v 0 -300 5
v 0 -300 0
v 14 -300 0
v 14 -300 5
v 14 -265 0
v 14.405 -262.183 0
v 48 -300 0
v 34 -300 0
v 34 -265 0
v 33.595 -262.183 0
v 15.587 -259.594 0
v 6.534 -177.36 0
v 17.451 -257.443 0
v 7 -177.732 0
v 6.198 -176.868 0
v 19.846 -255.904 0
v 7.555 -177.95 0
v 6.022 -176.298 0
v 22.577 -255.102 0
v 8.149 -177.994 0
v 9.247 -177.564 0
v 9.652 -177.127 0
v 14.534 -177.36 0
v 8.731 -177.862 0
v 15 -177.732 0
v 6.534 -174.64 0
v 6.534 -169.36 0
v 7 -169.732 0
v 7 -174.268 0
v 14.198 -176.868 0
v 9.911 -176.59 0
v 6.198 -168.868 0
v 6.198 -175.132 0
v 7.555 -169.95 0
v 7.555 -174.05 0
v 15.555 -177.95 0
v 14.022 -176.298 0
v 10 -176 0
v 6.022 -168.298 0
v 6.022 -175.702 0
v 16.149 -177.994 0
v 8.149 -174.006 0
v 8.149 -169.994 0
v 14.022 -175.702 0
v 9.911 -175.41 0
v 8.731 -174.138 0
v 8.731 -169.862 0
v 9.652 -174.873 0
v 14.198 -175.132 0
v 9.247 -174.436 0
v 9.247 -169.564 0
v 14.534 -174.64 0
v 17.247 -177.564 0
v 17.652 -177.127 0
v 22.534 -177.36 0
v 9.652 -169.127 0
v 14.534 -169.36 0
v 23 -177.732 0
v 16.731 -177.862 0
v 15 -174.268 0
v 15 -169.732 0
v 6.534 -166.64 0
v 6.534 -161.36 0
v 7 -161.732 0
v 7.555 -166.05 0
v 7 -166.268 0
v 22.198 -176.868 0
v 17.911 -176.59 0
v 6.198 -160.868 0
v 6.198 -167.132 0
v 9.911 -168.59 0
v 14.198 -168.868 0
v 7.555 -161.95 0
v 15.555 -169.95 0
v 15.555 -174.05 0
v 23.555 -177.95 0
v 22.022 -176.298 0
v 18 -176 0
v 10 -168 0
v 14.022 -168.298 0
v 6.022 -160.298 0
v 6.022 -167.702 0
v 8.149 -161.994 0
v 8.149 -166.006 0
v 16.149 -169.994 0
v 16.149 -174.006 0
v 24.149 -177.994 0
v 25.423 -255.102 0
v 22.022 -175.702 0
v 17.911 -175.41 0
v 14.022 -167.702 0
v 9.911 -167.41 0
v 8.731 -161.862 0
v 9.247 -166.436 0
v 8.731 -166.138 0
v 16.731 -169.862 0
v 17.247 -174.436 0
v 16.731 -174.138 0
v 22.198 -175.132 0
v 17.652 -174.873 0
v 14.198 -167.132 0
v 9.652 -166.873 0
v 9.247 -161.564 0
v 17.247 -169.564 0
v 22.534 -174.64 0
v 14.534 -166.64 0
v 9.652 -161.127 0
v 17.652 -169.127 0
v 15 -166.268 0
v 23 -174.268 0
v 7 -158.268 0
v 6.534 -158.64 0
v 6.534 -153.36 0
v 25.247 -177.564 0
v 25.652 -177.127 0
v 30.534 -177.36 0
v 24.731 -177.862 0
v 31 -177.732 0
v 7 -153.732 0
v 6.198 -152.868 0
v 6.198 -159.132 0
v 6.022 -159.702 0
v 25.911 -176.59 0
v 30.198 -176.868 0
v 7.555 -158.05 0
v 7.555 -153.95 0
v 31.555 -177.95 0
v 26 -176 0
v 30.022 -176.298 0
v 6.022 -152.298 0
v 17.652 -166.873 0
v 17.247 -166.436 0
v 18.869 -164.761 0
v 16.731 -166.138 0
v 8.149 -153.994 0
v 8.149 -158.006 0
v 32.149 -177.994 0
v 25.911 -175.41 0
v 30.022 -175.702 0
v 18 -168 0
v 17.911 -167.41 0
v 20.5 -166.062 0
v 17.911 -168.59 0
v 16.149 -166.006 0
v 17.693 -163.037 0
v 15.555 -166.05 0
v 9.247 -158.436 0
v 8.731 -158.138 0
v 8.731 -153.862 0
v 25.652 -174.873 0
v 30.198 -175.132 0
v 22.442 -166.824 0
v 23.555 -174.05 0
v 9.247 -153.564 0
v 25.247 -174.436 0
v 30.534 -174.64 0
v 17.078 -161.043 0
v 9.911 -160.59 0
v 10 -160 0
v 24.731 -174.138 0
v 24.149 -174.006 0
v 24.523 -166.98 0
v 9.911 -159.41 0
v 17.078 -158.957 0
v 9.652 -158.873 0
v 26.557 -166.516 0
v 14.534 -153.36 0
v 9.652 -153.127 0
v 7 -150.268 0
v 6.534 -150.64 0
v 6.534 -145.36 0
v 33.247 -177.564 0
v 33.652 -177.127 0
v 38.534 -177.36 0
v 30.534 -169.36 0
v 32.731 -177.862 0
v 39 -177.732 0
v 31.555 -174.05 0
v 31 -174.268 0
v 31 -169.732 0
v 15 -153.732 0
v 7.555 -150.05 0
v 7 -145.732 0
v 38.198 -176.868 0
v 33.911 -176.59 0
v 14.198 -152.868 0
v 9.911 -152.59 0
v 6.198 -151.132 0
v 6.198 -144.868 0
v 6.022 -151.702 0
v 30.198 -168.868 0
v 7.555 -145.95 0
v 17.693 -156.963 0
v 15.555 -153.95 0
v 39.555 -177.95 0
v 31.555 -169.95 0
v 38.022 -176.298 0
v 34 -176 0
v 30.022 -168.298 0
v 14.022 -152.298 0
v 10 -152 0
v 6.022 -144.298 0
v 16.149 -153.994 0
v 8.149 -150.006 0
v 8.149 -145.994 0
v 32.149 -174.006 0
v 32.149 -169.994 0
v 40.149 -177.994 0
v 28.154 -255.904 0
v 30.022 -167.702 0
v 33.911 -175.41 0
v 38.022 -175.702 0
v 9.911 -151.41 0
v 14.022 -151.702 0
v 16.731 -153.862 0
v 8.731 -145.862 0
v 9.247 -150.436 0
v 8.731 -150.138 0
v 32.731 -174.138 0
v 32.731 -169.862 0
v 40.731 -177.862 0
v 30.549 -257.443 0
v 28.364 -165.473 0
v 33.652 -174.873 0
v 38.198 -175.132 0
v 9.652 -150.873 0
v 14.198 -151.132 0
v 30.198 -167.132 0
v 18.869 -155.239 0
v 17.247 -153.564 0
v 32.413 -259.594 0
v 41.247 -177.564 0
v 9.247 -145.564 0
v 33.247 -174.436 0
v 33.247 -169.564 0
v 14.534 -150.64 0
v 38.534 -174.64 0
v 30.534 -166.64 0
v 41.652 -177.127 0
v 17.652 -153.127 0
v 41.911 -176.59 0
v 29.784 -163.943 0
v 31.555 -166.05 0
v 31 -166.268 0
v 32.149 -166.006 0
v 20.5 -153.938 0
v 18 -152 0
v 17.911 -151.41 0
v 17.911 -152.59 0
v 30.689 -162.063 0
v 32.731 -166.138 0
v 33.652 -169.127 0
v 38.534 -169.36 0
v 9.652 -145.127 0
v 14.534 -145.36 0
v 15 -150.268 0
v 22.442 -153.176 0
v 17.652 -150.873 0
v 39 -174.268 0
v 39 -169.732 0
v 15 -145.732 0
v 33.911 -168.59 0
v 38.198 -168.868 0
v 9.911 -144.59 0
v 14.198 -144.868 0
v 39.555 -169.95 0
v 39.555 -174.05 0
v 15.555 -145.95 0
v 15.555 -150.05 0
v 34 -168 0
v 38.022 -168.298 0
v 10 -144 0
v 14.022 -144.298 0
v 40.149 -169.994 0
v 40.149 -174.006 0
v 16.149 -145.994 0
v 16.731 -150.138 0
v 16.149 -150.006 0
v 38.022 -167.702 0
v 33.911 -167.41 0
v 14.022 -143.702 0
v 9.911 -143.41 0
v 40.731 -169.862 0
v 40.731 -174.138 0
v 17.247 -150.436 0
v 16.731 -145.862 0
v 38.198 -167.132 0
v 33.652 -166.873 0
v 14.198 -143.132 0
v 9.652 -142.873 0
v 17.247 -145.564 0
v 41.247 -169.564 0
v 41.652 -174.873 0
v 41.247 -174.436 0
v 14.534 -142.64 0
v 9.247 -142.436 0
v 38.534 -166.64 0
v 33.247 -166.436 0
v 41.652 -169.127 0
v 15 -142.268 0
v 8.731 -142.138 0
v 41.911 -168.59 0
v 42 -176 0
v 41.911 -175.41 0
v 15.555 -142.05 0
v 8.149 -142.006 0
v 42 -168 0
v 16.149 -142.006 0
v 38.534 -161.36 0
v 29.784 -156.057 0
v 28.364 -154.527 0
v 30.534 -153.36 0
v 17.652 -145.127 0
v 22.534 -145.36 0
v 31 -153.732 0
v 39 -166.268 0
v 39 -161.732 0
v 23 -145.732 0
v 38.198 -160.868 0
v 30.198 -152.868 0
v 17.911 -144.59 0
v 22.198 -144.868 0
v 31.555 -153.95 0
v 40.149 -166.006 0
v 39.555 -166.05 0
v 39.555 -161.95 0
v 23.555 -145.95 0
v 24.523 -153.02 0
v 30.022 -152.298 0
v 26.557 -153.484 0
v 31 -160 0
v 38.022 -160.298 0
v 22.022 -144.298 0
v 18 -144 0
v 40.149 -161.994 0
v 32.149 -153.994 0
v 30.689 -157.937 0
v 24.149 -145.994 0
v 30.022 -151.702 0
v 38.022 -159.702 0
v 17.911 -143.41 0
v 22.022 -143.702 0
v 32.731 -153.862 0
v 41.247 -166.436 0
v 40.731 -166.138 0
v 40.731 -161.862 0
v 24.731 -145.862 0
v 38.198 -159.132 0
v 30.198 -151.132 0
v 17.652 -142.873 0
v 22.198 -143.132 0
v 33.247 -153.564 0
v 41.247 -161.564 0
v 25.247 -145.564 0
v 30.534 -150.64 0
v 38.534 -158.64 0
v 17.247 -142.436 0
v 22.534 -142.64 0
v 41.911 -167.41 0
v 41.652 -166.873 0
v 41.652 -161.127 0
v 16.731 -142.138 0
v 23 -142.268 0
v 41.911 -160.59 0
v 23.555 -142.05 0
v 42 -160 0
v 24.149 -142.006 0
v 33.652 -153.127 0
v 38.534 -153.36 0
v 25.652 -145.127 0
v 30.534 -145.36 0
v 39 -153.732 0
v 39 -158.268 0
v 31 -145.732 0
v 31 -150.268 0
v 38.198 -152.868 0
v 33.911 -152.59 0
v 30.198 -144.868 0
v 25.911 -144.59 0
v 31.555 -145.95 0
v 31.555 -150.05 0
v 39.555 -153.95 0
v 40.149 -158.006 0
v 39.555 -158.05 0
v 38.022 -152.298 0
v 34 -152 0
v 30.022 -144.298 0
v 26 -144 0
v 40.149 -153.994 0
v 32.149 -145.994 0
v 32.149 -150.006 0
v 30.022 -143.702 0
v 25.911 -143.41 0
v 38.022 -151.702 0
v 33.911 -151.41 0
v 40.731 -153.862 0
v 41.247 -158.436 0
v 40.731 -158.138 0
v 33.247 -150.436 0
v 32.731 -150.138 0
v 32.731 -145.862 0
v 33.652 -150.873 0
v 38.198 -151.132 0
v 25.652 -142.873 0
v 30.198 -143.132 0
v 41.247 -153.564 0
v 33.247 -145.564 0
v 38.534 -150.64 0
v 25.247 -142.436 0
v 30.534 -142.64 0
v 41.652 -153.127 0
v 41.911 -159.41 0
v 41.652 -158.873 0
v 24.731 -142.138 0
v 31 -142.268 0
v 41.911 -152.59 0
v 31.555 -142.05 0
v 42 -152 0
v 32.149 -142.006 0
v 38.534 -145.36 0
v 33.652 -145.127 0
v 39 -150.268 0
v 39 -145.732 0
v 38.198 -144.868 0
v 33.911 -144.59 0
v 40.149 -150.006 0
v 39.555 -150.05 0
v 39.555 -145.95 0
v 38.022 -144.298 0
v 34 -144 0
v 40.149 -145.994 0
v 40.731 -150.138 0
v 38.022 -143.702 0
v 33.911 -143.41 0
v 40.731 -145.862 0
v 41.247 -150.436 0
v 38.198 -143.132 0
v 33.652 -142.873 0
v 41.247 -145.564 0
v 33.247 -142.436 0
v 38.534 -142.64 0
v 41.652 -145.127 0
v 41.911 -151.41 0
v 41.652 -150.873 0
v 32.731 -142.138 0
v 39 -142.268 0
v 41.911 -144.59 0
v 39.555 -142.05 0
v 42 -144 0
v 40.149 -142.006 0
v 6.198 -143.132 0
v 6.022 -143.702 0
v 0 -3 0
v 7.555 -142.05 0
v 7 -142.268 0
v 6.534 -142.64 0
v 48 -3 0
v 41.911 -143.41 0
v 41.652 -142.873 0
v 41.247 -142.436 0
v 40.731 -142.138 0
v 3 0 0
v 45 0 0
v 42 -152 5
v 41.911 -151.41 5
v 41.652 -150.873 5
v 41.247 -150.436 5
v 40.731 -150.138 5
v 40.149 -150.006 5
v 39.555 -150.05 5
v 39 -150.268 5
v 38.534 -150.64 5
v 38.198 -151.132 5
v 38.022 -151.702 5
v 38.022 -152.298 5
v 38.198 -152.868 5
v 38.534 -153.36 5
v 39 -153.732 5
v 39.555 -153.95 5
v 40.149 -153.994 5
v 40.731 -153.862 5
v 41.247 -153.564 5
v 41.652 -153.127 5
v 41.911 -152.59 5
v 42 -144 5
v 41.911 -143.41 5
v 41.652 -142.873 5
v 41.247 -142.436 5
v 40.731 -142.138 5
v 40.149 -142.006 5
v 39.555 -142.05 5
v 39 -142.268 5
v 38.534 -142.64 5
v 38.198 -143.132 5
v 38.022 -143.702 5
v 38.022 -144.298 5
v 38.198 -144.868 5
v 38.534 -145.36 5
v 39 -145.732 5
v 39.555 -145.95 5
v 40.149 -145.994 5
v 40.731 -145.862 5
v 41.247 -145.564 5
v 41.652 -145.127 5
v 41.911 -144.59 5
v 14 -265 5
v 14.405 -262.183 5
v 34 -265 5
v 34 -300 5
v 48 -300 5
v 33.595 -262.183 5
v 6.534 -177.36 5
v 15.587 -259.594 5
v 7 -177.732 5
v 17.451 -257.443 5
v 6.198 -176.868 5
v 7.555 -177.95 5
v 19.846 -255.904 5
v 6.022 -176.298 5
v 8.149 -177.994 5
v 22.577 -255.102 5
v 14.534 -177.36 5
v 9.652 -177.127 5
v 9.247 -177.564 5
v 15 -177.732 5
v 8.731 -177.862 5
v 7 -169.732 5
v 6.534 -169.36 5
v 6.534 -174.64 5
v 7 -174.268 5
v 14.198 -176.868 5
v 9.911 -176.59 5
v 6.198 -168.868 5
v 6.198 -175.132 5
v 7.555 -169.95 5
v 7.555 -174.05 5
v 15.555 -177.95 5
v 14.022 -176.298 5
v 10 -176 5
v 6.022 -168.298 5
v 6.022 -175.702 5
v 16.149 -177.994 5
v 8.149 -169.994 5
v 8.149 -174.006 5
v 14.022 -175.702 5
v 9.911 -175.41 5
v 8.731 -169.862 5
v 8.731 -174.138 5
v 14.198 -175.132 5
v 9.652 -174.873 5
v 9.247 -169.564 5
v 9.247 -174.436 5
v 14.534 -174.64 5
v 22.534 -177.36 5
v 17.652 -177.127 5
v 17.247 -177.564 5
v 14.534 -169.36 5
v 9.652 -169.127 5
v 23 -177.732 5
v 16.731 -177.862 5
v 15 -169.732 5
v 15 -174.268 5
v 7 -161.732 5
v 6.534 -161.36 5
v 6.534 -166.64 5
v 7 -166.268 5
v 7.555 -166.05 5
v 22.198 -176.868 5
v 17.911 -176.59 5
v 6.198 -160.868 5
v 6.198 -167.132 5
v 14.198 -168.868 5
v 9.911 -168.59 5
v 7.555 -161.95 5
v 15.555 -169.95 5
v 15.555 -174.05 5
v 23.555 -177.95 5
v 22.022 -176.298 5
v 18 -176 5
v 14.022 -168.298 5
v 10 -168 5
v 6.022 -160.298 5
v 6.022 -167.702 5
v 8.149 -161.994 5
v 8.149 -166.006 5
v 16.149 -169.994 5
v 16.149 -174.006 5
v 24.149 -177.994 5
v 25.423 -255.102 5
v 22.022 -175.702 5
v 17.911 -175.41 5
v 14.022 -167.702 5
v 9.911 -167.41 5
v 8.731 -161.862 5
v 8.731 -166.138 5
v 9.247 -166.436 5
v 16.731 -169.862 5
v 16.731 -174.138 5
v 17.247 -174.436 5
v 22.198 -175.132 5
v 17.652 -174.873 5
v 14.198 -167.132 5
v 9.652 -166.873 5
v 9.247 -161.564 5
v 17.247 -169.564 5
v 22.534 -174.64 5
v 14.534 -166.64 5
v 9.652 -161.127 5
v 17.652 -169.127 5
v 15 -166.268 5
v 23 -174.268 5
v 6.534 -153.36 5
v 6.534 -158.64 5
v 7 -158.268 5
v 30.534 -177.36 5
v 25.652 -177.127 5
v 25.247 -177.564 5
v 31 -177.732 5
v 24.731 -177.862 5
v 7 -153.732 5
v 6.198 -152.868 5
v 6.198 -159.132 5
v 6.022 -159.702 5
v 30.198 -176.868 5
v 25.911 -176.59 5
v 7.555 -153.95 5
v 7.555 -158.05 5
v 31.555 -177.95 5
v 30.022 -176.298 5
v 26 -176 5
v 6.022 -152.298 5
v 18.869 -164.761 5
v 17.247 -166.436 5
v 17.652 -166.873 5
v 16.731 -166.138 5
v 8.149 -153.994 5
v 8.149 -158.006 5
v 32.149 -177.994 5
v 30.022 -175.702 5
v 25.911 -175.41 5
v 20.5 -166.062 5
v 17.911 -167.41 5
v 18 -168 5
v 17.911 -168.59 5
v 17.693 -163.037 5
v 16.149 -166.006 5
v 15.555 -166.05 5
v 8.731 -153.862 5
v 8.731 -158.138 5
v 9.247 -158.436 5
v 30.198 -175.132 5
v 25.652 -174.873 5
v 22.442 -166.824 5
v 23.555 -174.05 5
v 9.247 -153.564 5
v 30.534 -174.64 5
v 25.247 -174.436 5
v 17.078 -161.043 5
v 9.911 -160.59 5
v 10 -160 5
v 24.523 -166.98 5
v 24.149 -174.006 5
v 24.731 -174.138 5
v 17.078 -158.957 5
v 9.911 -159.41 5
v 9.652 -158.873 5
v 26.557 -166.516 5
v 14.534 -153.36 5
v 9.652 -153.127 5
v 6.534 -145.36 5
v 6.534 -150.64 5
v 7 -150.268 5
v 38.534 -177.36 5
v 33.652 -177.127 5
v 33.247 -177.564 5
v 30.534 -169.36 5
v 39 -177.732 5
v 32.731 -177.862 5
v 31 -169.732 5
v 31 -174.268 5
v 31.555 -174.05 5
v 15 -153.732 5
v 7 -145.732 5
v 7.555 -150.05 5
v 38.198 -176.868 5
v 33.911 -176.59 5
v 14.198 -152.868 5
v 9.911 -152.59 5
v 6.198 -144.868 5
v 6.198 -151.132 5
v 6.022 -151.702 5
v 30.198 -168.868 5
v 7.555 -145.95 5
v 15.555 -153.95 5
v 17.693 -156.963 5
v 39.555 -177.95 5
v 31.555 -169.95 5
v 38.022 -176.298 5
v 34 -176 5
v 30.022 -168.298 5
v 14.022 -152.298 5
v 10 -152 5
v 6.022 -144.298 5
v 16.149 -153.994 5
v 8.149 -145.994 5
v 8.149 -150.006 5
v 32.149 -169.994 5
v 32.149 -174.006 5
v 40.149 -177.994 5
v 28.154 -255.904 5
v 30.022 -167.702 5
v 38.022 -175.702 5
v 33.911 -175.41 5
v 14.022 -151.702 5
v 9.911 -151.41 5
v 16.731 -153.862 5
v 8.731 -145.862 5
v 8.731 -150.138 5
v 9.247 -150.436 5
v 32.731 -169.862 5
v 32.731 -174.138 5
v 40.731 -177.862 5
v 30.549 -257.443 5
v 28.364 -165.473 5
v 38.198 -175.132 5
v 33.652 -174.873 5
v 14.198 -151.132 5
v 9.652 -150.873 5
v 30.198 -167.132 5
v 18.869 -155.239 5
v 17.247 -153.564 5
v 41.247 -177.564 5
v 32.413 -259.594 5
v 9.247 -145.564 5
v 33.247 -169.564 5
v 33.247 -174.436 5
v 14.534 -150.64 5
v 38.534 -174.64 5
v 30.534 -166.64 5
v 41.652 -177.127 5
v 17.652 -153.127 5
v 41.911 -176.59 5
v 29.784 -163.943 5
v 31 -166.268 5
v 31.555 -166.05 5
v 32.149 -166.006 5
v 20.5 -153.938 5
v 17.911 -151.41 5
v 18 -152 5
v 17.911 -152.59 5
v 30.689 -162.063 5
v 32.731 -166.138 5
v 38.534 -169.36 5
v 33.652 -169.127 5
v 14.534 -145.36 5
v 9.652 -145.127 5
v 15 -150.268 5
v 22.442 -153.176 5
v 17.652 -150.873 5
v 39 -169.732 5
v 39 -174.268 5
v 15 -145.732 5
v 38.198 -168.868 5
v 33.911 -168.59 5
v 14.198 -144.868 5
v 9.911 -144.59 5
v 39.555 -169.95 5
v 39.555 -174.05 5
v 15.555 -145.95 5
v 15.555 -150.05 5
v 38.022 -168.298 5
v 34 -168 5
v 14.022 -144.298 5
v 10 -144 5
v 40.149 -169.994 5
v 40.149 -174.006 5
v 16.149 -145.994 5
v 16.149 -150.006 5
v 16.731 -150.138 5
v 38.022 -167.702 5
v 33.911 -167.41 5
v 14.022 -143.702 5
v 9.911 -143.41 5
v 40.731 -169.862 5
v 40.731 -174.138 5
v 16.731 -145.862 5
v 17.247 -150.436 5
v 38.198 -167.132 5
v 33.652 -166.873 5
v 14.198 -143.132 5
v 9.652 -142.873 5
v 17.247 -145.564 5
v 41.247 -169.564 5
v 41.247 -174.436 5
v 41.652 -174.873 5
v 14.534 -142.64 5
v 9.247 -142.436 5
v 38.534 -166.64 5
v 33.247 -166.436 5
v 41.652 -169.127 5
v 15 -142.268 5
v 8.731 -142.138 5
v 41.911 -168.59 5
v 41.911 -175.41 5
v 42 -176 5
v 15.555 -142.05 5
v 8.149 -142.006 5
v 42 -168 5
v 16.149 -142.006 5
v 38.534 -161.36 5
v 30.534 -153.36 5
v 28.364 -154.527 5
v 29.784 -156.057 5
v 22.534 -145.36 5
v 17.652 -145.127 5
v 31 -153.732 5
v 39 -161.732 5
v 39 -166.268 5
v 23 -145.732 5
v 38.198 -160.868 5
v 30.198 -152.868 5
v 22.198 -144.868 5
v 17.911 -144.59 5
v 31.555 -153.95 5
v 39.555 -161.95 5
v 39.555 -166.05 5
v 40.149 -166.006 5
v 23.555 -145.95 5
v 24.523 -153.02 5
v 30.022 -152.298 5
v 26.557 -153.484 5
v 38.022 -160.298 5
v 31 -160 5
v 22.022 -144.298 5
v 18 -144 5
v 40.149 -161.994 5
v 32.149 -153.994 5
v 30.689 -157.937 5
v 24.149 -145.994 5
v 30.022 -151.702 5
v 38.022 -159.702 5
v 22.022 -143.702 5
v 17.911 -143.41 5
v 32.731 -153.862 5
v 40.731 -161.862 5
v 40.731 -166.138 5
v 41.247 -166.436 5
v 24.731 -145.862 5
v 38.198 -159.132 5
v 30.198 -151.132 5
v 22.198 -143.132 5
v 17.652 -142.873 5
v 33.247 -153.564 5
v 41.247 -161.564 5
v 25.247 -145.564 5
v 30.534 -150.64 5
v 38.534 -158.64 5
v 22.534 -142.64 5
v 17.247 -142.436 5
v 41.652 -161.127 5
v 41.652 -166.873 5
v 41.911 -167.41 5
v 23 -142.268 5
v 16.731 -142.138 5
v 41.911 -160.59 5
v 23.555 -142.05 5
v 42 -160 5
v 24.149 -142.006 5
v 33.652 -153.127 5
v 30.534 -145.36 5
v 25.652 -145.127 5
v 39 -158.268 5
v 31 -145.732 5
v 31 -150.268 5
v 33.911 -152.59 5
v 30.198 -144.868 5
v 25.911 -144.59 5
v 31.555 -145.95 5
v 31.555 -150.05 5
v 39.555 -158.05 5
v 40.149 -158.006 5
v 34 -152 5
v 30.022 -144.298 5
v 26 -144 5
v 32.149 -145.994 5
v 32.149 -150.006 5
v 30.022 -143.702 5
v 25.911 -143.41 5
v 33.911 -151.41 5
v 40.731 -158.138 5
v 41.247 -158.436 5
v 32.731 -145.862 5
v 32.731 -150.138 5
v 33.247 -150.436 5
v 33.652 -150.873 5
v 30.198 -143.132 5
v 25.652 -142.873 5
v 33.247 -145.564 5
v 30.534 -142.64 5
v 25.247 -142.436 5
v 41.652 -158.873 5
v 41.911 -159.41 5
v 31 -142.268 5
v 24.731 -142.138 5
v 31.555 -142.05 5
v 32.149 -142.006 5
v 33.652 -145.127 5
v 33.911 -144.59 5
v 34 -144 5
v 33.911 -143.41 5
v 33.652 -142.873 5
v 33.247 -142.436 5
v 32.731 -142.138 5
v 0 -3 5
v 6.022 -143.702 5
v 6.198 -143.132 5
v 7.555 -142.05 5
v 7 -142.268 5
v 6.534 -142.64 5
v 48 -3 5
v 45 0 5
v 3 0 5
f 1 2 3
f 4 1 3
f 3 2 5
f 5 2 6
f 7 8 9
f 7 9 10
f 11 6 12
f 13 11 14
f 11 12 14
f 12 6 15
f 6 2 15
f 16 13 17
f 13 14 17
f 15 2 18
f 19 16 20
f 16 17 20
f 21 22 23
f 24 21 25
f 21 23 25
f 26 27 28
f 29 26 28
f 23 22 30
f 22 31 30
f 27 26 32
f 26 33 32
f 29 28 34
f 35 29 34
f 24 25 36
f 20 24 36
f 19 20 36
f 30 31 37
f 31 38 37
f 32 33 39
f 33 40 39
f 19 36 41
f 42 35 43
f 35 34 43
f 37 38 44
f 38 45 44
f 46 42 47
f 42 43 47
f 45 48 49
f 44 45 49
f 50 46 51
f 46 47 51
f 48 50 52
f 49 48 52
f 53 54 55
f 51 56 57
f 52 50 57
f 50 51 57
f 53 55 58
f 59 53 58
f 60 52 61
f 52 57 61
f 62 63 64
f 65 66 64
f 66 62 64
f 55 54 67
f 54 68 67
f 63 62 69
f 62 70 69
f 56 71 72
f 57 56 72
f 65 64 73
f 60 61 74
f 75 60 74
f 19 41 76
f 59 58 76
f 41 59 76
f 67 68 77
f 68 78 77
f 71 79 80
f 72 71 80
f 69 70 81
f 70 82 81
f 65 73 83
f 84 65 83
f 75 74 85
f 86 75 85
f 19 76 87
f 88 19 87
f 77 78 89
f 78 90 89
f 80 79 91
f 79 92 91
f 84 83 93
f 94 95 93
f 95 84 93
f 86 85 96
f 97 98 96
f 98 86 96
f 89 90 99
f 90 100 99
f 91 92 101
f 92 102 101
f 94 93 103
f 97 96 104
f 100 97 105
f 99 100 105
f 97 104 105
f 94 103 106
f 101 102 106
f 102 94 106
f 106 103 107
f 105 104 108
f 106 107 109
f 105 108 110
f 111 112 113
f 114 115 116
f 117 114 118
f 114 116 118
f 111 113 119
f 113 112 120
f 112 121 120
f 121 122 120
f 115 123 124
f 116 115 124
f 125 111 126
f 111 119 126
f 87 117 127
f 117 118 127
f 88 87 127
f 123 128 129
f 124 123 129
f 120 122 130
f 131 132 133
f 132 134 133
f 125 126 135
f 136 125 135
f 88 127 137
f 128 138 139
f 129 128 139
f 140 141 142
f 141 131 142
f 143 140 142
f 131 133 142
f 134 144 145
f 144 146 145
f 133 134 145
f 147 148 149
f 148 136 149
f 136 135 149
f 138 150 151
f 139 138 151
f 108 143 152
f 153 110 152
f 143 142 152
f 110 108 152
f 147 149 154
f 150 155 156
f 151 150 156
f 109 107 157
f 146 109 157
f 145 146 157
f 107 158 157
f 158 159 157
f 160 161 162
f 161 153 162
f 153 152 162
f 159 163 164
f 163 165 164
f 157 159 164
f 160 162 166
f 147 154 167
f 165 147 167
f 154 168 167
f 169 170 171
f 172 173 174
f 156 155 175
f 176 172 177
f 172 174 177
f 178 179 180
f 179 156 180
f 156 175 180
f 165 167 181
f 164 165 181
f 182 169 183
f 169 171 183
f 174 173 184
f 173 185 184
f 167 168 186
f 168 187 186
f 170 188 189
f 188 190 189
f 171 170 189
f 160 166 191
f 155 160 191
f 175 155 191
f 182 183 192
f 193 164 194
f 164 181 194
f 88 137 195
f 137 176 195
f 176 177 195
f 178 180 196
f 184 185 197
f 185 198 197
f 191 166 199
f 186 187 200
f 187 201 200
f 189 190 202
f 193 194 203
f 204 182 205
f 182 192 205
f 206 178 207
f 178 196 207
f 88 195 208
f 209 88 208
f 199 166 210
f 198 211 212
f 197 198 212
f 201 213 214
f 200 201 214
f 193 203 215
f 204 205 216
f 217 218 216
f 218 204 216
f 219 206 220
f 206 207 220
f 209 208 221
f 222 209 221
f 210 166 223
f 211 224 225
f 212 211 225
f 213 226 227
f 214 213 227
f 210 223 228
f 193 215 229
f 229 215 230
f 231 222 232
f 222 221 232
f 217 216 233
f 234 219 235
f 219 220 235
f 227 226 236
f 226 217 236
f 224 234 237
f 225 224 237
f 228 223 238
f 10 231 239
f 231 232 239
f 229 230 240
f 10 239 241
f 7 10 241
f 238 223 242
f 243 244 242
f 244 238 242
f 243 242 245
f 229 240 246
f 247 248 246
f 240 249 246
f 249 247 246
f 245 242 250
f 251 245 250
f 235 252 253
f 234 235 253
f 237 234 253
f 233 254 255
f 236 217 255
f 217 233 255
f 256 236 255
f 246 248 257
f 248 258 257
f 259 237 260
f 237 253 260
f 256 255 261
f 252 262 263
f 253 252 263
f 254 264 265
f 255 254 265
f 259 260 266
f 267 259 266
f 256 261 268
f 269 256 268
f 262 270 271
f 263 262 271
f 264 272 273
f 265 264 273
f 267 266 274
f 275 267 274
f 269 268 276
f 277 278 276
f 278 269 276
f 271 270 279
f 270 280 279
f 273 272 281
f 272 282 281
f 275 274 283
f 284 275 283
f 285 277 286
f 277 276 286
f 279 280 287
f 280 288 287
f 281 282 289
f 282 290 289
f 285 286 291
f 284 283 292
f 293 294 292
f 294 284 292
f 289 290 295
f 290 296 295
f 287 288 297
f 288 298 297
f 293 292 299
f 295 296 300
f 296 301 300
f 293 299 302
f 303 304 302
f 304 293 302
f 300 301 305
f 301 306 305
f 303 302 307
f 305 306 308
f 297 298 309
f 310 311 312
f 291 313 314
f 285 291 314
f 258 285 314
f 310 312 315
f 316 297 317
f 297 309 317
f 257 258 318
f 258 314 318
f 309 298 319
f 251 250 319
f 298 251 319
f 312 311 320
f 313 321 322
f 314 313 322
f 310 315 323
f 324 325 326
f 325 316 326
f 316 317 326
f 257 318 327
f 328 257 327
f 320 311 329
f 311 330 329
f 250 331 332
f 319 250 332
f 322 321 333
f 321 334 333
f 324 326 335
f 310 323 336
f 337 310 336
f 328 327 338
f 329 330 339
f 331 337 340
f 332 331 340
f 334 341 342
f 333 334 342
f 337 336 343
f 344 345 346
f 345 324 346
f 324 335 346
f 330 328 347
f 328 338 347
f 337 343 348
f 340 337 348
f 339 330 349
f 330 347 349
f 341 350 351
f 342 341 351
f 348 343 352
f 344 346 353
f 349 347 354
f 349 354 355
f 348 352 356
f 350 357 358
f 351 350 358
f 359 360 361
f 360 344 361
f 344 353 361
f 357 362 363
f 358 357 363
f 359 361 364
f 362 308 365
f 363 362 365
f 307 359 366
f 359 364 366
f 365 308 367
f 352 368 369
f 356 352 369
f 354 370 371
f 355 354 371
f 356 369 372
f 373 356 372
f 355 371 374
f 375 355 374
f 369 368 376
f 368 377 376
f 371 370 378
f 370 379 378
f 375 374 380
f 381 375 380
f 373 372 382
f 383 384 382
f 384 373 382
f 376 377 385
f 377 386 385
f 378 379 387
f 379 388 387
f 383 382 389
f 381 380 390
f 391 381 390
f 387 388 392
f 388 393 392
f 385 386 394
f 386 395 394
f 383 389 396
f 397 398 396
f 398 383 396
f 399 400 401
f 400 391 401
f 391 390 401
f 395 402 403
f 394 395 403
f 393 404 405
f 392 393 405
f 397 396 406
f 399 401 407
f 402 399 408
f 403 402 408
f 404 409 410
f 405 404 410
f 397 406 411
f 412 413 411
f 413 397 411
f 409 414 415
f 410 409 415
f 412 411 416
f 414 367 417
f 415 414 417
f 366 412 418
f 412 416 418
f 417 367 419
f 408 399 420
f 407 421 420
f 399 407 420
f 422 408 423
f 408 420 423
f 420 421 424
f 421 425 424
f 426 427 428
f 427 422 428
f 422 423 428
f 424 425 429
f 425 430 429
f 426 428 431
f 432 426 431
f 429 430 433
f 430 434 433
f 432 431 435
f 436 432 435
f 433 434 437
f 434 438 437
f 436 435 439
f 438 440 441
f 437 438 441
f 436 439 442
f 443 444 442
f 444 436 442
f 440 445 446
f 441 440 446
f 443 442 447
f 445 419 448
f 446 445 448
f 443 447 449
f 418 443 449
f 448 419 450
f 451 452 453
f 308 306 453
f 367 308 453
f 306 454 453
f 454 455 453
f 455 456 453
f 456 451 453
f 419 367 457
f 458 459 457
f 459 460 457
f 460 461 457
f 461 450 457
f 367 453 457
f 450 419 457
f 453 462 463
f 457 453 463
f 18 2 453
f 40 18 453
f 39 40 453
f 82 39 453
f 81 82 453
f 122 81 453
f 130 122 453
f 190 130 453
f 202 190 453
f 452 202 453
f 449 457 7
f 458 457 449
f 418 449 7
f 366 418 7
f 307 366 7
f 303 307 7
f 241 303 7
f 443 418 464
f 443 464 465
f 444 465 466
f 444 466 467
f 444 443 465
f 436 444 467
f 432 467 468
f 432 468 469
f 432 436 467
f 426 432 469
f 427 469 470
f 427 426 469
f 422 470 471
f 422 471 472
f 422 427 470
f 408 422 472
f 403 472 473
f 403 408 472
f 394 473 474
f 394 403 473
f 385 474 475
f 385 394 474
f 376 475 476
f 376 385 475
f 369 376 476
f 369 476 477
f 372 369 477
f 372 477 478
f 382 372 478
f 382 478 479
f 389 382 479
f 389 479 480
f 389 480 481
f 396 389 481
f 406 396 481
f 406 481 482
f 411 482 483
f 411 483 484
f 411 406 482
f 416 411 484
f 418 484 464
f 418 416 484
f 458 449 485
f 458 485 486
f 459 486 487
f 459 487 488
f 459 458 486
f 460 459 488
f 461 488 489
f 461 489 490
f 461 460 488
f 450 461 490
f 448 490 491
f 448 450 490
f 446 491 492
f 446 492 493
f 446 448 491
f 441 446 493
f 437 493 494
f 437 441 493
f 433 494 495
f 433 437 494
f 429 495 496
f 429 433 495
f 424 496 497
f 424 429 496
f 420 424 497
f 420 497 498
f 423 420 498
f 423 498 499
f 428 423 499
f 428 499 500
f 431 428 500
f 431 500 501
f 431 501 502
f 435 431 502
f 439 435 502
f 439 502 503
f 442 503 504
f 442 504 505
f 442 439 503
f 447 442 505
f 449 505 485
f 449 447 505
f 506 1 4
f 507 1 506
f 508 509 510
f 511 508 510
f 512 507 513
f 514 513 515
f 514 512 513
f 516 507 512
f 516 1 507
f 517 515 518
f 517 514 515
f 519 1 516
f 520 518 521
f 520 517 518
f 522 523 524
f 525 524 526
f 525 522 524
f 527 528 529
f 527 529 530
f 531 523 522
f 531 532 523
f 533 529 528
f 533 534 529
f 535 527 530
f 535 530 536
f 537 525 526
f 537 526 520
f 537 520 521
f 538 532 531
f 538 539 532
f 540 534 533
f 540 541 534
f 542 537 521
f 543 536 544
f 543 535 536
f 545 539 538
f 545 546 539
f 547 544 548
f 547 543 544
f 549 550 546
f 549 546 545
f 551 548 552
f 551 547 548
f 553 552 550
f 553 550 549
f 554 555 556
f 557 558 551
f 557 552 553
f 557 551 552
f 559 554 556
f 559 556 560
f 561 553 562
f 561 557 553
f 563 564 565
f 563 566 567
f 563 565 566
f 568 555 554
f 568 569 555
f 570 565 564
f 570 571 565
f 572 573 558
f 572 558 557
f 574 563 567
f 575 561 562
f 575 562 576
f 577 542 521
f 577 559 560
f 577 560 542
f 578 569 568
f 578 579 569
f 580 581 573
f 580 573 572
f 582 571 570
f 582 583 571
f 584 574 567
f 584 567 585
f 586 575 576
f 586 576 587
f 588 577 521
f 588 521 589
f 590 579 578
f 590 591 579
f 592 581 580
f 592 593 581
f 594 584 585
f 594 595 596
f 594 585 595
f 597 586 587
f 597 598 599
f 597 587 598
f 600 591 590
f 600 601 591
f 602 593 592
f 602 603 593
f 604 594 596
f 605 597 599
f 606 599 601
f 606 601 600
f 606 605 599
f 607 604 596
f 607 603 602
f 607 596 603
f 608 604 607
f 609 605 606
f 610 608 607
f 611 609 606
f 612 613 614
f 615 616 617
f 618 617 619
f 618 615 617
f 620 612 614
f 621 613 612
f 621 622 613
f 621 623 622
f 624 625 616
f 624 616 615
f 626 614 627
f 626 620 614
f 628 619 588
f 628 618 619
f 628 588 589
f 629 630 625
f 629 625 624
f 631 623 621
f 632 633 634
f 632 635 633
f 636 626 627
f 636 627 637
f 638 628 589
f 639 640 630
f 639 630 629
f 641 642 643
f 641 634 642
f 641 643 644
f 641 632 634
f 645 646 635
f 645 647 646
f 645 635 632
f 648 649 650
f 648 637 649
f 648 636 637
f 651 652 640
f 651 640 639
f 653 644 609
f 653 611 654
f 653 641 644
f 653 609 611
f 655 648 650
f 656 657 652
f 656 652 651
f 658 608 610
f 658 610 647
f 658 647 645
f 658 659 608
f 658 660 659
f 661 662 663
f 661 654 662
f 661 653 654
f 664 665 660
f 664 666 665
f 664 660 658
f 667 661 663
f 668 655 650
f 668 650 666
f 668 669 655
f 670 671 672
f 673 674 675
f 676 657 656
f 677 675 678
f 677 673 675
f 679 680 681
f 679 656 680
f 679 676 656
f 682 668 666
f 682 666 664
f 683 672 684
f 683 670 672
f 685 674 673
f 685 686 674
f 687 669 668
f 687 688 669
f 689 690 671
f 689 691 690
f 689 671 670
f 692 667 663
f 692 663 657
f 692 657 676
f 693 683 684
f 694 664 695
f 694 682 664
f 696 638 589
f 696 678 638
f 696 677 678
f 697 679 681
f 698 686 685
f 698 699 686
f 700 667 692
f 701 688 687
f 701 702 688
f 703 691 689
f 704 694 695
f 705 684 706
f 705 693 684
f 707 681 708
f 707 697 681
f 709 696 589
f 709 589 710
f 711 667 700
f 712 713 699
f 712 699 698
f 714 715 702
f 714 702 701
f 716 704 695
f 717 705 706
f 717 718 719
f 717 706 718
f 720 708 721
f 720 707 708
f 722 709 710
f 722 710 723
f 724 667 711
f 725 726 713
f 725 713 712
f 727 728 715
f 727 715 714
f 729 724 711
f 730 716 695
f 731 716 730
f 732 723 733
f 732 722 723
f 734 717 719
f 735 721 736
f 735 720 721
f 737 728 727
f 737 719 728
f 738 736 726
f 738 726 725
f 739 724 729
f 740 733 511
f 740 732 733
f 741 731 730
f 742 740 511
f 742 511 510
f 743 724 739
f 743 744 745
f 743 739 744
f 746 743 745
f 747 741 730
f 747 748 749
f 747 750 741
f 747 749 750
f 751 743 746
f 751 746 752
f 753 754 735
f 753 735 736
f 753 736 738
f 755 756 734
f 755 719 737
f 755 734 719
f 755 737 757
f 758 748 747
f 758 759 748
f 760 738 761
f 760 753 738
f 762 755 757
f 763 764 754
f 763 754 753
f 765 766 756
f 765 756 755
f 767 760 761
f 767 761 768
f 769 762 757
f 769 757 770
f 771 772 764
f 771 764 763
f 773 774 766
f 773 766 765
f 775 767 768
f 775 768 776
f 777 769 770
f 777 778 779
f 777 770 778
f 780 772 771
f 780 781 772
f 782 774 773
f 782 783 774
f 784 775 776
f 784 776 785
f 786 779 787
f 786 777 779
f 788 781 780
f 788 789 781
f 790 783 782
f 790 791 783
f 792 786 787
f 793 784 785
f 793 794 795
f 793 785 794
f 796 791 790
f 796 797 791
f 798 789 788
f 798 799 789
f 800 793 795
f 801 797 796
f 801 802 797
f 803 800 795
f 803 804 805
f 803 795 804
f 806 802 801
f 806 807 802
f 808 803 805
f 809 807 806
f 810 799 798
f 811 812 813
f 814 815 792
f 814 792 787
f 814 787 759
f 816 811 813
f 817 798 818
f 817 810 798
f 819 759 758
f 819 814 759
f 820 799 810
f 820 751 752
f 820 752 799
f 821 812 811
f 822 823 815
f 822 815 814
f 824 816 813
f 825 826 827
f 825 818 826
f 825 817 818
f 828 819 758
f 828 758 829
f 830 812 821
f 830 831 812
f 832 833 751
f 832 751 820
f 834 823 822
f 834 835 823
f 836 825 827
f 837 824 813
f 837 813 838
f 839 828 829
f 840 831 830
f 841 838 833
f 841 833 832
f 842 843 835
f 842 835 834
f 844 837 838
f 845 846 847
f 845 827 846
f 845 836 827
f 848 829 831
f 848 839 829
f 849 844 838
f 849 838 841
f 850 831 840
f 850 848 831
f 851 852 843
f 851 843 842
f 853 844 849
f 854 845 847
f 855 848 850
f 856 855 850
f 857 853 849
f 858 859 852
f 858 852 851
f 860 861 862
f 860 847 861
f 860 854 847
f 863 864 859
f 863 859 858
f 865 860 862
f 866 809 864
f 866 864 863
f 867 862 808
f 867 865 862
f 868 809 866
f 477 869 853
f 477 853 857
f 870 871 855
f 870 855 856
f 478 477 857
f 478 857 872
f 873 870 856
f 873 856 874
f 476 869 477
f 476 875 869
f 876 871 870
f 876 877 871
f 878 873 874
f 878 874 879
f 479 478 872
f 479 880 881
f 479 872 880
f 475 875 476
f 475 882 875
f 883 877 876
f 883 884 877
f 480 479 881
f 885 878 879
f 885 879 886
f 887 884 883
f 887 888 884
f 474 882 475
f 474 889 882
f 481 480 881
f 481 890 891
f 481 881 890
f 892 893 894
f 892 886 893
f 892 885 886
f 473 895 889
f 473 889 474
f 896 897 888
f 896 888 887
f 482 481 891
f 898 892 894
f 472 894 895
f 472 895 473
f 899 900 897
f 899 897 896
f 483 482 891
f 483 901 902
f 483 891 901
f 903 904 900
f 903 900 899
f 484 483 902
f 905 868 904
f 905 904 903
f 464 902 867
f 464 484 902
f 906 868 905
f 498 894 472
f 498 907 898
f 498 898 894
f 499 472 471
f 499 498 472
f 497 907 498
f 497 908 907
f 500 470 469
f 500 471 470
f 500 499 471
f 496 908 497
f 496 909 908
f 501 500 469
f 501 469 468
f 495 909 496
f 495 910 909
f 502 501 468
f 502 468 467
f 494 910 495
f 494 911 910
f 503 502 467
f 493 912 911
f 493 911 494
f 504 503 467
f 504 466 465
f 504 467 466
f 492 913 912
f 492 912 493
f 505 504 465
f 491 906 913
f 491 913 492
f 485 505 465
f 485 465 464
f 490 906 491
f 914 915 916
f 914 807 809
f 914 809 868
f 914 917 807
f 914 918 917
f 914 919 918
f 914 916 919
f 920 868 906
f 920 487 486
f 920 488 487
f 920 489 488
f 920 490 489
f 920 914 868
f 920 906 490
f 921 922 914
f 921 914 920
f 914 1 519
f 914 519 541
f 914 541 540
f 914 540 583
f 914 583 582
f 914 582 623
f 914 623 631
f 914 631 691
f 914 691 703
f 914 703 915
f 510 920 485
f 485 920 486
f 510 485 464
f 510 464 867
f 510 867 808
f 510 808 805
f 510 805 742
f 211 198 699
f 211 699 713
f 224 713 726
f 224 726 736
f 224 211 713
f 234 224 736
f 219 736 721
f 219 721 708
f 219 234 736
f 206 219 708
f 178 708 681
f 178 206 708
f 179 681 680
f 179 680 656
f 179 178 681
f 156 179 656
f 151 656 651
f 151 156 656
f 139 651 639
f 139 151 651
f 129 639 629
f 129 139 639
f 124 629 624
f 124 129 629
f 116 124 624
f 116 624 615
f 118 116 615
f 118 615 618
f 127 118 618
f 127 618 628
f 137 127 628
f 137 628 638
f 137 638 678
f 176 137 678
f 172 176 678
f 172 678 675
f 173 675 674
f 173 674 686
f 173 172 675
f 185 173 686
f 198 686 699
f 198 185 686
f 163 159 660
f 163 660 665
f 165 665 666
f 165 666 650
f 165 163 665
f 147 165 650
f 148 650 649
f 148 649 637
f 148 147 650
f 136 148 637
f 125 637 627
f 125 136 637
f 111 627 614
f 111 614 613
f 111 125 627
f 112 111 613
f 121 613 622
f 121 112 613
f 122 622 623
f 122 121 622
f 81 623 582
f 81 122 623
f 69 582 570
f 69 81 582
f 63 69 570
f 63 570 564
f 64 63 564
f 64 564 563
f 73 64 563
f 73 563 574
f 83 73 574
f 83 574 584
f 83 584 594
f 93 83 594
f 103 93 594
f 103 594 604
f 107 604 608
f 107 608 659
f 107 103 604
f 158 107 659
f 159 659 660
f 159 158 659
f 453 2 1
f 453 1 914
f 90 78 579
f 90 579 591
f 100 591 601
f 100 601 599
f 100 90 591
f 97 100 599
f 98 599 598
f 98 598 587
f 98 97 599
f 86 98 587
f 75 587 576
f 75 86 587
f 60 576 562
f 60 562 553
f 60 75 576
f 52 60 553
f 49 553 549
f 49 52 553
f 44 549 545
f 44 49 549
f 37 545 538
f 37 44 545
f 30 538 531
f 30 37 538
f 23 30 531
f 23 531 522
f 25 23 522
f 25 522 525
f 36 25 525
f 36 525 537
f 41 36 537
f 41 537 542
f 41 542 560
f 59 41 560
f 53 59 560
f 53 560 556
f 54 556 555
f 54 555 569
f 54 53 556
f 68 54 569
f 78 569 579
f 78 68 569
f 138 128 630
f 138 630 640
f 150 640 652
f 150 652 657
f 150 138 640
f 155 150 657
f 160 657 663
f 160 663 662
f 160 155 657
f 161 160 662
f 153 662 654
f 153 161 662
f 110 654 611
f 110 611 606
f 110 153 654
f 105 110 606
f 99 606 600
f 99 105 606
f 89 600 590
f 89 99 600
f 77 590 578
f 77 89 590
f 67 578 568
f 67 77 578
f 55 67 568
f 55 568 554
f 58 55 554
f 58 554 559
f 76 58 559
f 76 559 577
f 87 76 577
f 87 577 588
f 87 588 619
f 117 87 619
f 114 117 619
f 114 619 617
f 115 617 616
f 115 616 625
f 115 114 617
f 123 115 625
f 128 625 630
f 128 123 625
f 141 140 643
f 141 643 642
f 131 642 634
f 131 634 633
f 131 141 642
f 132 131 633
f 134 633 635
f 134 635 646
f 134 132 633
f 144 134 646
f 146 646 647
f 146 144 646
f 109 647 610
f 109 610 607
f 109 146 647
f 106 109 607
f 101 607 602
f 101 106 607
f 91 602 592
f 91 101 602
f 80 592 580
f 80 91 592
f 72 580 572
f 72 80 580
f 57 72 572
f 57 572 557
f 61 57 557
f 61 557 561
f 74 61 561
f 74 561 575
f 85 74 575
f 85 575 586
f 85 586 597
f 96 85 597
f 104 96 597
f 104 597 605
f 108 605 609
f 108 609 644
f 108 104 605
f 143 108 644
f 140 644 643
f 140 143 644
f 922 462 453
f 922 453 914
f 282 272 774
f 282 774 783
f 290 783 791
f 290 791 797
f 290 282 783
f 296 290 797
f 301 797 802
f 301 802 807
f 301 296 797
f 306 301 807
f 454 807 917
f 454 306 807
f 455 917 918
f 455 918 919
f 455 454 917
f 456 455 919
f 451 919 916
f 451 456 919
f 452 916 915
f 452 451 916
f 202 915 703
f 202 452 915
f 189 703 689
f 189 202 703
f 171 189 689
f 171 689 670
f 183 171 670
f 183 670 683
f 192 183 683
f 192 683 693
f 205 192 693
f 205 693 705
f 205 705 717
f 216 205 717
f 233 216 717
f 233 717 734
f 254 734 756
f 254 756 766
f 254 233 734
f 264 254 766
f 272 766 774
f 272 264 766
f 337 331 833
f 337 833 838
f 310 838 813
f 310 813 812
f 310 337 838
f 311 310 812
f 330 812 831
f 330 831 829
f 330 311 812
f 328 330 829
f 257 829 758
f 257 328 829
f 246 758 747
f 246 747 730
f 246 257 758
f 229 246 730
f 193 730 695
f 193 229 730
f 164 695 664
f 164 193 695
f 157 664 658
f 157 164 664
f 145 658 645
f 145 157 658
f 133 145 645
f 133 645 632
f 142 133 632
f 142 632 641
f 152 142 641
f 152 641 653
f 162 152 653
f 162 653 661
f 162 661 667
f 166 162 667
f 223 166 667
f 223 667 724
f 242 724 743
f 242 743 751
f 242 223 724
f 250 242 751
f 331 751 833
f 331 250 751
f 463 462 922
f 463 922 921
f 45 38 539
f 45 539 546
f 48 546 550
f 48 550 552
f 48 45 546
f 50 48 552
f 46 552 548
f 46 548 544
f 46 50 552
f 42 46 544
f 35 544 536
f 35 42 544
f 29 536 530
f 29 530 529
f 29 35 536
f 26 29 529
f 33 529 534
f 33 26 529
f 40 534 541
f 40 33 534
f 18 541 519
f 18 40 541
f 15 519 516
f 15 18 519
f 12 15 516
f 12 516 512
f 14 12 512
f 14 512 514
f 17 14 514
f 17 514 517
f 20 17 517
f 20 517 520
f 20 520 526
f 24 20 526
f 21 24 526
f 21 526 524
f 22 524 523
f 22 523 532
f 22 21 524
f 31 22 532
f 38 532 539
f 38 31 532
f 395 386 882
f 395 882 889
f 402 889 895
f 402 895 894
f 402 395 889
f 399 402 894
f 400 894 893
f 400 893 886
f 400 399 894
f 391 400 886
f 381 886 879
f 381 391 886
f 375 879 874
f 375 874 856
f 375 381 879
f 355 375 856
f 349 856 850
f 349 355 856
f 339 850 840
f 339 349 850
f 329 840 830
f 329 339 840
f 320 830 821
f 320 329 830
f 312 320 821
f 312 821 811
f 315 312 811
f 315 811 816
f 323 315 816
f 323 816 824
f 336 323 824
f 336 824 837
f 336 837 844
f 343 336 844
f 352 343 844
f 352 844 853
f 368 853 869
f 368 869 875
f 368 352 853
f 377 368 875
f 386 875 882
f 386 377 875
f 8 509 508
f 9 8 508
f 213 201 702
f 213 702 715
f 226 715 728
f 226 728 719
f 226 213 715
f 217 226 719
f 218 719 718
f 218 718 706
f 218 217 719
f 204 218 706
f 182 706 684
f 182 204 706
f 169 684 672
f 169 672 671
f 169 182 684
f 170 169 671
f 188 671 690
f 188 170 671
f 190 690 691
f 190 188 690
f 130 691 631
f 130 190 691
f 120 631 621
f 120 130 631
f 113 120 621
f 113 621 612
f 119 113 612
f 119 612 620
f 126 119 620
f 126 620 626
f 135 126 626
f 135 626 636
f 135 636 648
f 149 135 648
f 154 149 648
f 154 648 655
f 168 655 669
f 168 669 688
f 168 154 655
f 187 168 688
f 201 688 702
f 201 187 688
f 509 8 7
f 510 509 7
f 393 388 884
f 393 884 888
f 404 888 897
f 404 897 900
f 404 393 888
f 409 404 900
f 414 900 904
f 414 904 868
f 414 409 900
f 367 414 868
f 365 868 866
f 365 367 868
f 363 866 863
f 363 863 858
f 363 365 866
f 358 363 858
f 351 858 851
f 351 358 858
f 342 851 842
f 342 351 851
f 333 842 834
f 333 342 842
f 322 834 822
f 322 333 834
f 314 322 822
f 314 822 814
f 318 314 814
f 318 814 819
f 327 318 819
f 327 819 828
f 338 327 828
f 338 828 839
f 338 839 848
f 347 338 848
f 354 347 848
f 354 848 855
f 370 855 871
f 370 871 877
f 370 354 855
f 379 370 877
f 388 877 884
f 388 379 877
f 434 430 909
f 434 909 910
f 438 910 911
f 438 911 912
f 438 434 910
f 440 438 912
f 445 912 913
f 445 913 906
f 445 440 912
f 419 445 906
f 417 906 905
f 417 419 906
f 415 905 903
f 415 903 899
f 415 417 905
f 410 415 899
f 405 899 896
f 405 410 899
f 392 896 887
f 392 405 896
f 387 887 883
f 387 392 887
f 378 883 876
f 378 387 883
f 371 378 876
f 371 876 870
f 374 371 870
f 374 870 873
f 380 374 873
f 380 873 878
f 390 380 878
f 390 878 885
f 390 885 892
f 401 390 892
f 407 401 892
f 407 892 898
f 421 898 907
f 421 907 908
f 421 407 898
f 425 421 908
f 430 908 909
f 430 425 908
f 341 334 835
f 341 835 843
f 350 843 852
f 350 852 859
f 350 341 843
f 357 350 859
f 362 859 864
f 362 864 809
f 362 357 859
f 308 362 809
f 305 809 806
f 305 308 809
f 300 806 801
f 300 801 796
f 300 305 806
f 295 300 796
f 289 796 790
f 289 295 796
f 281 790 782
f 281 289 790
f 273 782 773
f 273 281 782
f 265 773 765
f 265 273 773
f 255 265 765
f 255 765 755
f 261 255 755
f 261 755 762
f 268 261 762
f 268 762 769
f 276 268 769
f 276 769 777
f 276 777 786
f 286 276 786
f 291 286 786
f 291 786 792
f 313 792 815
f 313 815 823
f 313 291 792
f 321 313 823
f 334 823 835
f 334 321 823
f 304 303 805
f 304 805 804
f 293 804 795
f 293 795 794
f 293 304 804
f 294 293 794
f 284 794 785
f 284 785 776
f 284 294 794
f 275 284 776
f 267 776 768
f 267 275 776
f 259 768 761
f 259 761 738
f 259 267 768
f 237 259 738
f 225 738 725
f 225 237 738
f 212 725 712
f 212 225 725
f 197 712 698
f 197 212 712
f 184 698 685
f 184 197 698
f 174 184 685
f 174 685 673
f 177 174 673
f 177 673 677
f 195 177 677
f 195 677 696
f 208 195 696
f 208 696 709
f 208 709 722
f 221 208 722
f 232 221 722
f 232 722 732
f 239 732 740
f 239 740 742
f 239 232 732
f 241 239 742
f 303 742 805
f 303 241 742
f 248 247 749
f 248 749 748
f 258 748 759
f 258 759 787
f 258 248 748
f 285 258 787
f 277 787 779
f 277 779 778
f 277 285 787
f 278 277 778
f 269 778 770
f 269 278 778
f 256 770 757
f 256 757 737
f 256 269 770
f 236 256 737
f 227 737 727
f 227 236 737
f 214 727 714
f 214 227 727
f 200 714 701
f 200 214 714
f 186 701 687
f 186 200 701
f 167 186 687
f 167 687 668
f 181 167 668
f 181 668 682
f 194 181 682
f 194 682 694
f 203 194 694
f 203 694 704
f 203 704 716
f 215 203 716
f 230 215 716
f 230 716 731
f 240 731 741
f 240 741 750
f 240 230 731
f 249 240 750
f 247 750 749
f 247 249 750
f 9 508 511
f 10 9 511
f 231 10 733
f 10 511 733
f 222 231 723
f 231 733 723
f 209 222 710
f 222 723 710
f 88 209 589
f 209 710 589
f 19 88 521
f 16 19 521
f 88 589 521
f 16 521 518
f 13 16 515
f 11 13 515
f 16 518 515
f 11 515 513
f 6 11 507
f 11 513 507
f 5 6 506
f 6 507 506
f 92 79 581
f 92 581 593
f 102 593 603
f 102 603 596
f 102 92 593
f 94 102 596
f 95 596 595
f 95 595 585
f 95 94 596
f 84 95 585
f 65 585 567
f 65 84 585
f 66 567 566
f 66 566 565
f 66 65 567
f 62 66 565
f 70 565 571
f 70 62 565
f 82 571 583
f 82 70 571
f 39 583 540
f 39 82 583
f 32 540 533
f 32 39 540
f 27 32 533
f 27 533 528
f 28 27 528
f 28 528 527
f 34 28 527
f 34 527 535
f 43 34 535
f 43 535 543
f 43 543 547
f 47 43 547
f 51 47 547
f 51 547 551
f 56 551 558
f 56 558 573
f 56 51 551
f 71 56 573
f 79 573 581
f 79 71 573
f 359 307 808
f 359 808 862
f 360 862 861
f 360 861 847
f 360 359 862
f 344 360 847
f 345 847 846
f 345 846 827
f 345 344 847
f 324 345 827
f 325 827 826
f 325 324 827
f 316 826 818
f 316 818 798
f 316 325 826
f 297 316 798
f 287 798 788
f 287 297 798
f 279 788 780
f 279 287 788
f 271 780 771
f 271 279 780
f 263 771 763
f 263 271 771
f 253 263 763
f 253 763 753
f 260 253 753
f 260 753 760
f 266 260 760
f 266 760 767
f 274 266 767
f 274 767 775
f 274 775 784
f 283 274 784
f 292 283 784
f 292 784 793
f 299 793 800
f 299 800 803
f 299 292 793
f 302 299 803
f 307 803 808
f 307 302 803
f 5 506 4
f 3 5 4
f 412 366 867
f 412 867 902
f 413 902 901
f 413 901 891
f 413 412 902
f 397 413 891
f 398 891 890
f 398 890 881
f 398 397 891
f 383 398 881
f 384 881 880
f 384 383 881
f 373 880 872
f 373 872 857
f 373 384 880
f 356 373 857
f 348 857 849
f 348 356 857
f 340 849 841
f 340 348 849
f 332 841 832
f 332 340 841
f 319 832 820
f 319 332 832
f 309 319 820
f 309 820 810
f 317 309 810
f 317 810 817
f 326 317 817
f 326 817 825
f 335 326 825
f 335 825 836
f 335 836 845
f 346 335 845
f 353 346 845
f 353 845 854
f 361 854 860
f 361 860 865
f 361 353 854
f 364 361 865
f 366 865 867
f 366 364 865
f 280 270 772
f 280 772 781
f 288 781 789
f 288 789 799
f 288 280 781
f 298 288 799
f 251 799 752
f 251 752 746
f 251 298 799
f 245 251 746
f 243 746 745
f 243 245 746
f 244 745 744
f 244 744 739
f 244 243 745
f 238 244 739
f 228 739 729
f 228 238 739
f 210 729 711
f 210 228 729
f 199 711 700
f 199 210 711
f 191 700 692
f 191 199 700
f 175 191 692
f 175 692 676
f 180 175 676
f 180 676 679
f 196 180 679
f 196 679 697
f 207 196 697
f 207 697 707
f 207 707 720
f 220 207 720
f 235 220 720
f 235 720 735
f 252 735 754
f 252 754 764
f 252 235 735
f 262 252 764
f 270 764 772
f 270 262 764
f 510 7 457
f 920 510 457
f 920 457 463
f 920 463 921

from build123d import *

# Parameters (mm, degrees)
SKETCH1_W           = 48
SKETCH1_H           = 300
SKETCH1_R           = 7
SKETCH1_R_2         = 2
BOSS_EXTRUDE1_DEPTH = 5
CHAMFER1_SIZE       = 3
CUT_EXTRUDE1_DEPTH  = 304.856874202


with BuildPart() as part:
    # Sketch1 → Boss-Extrude1 (new body)
    with BuildSketch(Plane.XY):
        with Locations((24, -150)):
            Rectangle(SKETCH1_W, SKETCH1_H)
        with Locations((24, -160)):
            Circle(SKETCH1_R, mode=Mode.SUBTRACT)
        with Locations((8, -144)):
            Circle(SKETCH1_R_2, mode=Mode.SUBTRACT)
        with Locations((16, -144)):
            Circle(SKETCH1_R_2, mode=Mode.SUBTRACT)
        with Locations((24, -144)):
            Circle(SKETCH1_R_2, mode=Mode.SUBTRACT)
        with Locations((32, -144)):
            Circle(SKETCH1_R_2, mode=Mode.SUBTRACT)
        with Locations((40, -144)):
            Circle(SKETCH1_R_2, mode=Mode.SUBTRACT)
        with Locations((16, -152)):
            Circle(SKETCH1_R_2, mode=Mode.SUBTRACT)
        with Locations((32, -152)):
            Circle(SKETCH1_R_2, mode=Mode.SUBTRACT)
        with Locations((40, -152)):
            Circle(SKETCH1_R_2, mode=Mode.SUBTRACT)
        with Locations((40, -160)):
            Circle(SKETCH1_R_2, mode=Mode.SUBTRACT)
        with Locations((16, -168)):
            Circle(SKETCH1_R_2, mode=Mode.SUBTRACT)
        with Locations((32, -168)):
            Circle(SKETCH1_R_2, mode=Mode.SUBTRACT)
        with Locations((40, -168)):
            Circle(SKETCH1_R_2, mode=Mode.SUBTRACT)
        with Locations((16, -176)):
            Circle(SKETCH1_R_2, mode=Mode.SUBTRACT)
        with Locations((24, -176)):
            Circle(SKETCH1_R_2, mode=Mode.SUBTRACT)
        with Locations((32, -176)):
            Circle(SKETCH1_R_2, mode=Mode.SUBTRACT)
        with Locations((40, -176)):
            Circle(SKETCH1_R_2, mode=Mode.SUBTRACT)
        with Locations((8, -152)):
            Circle(SKETCH1_R_2, mode=Mode.SUBTRACT)
        with Locations((8, -160)):
            Circle(SKETCH1_R_2, mode=Mode.SUBTRACT)
        with Locations((8, -168)):
            Circle(SKETCH1_R_2, mode=Mode.SUBTRACT)
        with Locations((8, -176)):
            Circle(SKETCH1_R_2, mode=Mode.SUBTRACT)
    extrude(amount=BOSS_EXTRUDE1_DEPTH)

    # Chamfer1
    chamfer1_edges = [part.edges().sort_by_distance(p)[0] for p in [
        (48, 0, 2.5),
        (0, 0, 2.5),
    ]]
    chamfer(chamfer1_edges, length=CHAMFER1_SIZE)

    # Sketch2 → Cut-Extrude1 (cut, through all)
    with BuildSketch(Plane.XY.offset(5)):
        with BuildLine():
            Line((14, -265), (14, -300))
            Line((14, -300), (34, -300))
            Line((34, -300), (34, -265))
            ThreePointArc((34, -265), (24, -255), (14, -265))
        make_face()
    extrude(amount=-CUT_EXTRUDE1_DEPTH, mode=Mode.SUBTRACT)


solid = part.part
